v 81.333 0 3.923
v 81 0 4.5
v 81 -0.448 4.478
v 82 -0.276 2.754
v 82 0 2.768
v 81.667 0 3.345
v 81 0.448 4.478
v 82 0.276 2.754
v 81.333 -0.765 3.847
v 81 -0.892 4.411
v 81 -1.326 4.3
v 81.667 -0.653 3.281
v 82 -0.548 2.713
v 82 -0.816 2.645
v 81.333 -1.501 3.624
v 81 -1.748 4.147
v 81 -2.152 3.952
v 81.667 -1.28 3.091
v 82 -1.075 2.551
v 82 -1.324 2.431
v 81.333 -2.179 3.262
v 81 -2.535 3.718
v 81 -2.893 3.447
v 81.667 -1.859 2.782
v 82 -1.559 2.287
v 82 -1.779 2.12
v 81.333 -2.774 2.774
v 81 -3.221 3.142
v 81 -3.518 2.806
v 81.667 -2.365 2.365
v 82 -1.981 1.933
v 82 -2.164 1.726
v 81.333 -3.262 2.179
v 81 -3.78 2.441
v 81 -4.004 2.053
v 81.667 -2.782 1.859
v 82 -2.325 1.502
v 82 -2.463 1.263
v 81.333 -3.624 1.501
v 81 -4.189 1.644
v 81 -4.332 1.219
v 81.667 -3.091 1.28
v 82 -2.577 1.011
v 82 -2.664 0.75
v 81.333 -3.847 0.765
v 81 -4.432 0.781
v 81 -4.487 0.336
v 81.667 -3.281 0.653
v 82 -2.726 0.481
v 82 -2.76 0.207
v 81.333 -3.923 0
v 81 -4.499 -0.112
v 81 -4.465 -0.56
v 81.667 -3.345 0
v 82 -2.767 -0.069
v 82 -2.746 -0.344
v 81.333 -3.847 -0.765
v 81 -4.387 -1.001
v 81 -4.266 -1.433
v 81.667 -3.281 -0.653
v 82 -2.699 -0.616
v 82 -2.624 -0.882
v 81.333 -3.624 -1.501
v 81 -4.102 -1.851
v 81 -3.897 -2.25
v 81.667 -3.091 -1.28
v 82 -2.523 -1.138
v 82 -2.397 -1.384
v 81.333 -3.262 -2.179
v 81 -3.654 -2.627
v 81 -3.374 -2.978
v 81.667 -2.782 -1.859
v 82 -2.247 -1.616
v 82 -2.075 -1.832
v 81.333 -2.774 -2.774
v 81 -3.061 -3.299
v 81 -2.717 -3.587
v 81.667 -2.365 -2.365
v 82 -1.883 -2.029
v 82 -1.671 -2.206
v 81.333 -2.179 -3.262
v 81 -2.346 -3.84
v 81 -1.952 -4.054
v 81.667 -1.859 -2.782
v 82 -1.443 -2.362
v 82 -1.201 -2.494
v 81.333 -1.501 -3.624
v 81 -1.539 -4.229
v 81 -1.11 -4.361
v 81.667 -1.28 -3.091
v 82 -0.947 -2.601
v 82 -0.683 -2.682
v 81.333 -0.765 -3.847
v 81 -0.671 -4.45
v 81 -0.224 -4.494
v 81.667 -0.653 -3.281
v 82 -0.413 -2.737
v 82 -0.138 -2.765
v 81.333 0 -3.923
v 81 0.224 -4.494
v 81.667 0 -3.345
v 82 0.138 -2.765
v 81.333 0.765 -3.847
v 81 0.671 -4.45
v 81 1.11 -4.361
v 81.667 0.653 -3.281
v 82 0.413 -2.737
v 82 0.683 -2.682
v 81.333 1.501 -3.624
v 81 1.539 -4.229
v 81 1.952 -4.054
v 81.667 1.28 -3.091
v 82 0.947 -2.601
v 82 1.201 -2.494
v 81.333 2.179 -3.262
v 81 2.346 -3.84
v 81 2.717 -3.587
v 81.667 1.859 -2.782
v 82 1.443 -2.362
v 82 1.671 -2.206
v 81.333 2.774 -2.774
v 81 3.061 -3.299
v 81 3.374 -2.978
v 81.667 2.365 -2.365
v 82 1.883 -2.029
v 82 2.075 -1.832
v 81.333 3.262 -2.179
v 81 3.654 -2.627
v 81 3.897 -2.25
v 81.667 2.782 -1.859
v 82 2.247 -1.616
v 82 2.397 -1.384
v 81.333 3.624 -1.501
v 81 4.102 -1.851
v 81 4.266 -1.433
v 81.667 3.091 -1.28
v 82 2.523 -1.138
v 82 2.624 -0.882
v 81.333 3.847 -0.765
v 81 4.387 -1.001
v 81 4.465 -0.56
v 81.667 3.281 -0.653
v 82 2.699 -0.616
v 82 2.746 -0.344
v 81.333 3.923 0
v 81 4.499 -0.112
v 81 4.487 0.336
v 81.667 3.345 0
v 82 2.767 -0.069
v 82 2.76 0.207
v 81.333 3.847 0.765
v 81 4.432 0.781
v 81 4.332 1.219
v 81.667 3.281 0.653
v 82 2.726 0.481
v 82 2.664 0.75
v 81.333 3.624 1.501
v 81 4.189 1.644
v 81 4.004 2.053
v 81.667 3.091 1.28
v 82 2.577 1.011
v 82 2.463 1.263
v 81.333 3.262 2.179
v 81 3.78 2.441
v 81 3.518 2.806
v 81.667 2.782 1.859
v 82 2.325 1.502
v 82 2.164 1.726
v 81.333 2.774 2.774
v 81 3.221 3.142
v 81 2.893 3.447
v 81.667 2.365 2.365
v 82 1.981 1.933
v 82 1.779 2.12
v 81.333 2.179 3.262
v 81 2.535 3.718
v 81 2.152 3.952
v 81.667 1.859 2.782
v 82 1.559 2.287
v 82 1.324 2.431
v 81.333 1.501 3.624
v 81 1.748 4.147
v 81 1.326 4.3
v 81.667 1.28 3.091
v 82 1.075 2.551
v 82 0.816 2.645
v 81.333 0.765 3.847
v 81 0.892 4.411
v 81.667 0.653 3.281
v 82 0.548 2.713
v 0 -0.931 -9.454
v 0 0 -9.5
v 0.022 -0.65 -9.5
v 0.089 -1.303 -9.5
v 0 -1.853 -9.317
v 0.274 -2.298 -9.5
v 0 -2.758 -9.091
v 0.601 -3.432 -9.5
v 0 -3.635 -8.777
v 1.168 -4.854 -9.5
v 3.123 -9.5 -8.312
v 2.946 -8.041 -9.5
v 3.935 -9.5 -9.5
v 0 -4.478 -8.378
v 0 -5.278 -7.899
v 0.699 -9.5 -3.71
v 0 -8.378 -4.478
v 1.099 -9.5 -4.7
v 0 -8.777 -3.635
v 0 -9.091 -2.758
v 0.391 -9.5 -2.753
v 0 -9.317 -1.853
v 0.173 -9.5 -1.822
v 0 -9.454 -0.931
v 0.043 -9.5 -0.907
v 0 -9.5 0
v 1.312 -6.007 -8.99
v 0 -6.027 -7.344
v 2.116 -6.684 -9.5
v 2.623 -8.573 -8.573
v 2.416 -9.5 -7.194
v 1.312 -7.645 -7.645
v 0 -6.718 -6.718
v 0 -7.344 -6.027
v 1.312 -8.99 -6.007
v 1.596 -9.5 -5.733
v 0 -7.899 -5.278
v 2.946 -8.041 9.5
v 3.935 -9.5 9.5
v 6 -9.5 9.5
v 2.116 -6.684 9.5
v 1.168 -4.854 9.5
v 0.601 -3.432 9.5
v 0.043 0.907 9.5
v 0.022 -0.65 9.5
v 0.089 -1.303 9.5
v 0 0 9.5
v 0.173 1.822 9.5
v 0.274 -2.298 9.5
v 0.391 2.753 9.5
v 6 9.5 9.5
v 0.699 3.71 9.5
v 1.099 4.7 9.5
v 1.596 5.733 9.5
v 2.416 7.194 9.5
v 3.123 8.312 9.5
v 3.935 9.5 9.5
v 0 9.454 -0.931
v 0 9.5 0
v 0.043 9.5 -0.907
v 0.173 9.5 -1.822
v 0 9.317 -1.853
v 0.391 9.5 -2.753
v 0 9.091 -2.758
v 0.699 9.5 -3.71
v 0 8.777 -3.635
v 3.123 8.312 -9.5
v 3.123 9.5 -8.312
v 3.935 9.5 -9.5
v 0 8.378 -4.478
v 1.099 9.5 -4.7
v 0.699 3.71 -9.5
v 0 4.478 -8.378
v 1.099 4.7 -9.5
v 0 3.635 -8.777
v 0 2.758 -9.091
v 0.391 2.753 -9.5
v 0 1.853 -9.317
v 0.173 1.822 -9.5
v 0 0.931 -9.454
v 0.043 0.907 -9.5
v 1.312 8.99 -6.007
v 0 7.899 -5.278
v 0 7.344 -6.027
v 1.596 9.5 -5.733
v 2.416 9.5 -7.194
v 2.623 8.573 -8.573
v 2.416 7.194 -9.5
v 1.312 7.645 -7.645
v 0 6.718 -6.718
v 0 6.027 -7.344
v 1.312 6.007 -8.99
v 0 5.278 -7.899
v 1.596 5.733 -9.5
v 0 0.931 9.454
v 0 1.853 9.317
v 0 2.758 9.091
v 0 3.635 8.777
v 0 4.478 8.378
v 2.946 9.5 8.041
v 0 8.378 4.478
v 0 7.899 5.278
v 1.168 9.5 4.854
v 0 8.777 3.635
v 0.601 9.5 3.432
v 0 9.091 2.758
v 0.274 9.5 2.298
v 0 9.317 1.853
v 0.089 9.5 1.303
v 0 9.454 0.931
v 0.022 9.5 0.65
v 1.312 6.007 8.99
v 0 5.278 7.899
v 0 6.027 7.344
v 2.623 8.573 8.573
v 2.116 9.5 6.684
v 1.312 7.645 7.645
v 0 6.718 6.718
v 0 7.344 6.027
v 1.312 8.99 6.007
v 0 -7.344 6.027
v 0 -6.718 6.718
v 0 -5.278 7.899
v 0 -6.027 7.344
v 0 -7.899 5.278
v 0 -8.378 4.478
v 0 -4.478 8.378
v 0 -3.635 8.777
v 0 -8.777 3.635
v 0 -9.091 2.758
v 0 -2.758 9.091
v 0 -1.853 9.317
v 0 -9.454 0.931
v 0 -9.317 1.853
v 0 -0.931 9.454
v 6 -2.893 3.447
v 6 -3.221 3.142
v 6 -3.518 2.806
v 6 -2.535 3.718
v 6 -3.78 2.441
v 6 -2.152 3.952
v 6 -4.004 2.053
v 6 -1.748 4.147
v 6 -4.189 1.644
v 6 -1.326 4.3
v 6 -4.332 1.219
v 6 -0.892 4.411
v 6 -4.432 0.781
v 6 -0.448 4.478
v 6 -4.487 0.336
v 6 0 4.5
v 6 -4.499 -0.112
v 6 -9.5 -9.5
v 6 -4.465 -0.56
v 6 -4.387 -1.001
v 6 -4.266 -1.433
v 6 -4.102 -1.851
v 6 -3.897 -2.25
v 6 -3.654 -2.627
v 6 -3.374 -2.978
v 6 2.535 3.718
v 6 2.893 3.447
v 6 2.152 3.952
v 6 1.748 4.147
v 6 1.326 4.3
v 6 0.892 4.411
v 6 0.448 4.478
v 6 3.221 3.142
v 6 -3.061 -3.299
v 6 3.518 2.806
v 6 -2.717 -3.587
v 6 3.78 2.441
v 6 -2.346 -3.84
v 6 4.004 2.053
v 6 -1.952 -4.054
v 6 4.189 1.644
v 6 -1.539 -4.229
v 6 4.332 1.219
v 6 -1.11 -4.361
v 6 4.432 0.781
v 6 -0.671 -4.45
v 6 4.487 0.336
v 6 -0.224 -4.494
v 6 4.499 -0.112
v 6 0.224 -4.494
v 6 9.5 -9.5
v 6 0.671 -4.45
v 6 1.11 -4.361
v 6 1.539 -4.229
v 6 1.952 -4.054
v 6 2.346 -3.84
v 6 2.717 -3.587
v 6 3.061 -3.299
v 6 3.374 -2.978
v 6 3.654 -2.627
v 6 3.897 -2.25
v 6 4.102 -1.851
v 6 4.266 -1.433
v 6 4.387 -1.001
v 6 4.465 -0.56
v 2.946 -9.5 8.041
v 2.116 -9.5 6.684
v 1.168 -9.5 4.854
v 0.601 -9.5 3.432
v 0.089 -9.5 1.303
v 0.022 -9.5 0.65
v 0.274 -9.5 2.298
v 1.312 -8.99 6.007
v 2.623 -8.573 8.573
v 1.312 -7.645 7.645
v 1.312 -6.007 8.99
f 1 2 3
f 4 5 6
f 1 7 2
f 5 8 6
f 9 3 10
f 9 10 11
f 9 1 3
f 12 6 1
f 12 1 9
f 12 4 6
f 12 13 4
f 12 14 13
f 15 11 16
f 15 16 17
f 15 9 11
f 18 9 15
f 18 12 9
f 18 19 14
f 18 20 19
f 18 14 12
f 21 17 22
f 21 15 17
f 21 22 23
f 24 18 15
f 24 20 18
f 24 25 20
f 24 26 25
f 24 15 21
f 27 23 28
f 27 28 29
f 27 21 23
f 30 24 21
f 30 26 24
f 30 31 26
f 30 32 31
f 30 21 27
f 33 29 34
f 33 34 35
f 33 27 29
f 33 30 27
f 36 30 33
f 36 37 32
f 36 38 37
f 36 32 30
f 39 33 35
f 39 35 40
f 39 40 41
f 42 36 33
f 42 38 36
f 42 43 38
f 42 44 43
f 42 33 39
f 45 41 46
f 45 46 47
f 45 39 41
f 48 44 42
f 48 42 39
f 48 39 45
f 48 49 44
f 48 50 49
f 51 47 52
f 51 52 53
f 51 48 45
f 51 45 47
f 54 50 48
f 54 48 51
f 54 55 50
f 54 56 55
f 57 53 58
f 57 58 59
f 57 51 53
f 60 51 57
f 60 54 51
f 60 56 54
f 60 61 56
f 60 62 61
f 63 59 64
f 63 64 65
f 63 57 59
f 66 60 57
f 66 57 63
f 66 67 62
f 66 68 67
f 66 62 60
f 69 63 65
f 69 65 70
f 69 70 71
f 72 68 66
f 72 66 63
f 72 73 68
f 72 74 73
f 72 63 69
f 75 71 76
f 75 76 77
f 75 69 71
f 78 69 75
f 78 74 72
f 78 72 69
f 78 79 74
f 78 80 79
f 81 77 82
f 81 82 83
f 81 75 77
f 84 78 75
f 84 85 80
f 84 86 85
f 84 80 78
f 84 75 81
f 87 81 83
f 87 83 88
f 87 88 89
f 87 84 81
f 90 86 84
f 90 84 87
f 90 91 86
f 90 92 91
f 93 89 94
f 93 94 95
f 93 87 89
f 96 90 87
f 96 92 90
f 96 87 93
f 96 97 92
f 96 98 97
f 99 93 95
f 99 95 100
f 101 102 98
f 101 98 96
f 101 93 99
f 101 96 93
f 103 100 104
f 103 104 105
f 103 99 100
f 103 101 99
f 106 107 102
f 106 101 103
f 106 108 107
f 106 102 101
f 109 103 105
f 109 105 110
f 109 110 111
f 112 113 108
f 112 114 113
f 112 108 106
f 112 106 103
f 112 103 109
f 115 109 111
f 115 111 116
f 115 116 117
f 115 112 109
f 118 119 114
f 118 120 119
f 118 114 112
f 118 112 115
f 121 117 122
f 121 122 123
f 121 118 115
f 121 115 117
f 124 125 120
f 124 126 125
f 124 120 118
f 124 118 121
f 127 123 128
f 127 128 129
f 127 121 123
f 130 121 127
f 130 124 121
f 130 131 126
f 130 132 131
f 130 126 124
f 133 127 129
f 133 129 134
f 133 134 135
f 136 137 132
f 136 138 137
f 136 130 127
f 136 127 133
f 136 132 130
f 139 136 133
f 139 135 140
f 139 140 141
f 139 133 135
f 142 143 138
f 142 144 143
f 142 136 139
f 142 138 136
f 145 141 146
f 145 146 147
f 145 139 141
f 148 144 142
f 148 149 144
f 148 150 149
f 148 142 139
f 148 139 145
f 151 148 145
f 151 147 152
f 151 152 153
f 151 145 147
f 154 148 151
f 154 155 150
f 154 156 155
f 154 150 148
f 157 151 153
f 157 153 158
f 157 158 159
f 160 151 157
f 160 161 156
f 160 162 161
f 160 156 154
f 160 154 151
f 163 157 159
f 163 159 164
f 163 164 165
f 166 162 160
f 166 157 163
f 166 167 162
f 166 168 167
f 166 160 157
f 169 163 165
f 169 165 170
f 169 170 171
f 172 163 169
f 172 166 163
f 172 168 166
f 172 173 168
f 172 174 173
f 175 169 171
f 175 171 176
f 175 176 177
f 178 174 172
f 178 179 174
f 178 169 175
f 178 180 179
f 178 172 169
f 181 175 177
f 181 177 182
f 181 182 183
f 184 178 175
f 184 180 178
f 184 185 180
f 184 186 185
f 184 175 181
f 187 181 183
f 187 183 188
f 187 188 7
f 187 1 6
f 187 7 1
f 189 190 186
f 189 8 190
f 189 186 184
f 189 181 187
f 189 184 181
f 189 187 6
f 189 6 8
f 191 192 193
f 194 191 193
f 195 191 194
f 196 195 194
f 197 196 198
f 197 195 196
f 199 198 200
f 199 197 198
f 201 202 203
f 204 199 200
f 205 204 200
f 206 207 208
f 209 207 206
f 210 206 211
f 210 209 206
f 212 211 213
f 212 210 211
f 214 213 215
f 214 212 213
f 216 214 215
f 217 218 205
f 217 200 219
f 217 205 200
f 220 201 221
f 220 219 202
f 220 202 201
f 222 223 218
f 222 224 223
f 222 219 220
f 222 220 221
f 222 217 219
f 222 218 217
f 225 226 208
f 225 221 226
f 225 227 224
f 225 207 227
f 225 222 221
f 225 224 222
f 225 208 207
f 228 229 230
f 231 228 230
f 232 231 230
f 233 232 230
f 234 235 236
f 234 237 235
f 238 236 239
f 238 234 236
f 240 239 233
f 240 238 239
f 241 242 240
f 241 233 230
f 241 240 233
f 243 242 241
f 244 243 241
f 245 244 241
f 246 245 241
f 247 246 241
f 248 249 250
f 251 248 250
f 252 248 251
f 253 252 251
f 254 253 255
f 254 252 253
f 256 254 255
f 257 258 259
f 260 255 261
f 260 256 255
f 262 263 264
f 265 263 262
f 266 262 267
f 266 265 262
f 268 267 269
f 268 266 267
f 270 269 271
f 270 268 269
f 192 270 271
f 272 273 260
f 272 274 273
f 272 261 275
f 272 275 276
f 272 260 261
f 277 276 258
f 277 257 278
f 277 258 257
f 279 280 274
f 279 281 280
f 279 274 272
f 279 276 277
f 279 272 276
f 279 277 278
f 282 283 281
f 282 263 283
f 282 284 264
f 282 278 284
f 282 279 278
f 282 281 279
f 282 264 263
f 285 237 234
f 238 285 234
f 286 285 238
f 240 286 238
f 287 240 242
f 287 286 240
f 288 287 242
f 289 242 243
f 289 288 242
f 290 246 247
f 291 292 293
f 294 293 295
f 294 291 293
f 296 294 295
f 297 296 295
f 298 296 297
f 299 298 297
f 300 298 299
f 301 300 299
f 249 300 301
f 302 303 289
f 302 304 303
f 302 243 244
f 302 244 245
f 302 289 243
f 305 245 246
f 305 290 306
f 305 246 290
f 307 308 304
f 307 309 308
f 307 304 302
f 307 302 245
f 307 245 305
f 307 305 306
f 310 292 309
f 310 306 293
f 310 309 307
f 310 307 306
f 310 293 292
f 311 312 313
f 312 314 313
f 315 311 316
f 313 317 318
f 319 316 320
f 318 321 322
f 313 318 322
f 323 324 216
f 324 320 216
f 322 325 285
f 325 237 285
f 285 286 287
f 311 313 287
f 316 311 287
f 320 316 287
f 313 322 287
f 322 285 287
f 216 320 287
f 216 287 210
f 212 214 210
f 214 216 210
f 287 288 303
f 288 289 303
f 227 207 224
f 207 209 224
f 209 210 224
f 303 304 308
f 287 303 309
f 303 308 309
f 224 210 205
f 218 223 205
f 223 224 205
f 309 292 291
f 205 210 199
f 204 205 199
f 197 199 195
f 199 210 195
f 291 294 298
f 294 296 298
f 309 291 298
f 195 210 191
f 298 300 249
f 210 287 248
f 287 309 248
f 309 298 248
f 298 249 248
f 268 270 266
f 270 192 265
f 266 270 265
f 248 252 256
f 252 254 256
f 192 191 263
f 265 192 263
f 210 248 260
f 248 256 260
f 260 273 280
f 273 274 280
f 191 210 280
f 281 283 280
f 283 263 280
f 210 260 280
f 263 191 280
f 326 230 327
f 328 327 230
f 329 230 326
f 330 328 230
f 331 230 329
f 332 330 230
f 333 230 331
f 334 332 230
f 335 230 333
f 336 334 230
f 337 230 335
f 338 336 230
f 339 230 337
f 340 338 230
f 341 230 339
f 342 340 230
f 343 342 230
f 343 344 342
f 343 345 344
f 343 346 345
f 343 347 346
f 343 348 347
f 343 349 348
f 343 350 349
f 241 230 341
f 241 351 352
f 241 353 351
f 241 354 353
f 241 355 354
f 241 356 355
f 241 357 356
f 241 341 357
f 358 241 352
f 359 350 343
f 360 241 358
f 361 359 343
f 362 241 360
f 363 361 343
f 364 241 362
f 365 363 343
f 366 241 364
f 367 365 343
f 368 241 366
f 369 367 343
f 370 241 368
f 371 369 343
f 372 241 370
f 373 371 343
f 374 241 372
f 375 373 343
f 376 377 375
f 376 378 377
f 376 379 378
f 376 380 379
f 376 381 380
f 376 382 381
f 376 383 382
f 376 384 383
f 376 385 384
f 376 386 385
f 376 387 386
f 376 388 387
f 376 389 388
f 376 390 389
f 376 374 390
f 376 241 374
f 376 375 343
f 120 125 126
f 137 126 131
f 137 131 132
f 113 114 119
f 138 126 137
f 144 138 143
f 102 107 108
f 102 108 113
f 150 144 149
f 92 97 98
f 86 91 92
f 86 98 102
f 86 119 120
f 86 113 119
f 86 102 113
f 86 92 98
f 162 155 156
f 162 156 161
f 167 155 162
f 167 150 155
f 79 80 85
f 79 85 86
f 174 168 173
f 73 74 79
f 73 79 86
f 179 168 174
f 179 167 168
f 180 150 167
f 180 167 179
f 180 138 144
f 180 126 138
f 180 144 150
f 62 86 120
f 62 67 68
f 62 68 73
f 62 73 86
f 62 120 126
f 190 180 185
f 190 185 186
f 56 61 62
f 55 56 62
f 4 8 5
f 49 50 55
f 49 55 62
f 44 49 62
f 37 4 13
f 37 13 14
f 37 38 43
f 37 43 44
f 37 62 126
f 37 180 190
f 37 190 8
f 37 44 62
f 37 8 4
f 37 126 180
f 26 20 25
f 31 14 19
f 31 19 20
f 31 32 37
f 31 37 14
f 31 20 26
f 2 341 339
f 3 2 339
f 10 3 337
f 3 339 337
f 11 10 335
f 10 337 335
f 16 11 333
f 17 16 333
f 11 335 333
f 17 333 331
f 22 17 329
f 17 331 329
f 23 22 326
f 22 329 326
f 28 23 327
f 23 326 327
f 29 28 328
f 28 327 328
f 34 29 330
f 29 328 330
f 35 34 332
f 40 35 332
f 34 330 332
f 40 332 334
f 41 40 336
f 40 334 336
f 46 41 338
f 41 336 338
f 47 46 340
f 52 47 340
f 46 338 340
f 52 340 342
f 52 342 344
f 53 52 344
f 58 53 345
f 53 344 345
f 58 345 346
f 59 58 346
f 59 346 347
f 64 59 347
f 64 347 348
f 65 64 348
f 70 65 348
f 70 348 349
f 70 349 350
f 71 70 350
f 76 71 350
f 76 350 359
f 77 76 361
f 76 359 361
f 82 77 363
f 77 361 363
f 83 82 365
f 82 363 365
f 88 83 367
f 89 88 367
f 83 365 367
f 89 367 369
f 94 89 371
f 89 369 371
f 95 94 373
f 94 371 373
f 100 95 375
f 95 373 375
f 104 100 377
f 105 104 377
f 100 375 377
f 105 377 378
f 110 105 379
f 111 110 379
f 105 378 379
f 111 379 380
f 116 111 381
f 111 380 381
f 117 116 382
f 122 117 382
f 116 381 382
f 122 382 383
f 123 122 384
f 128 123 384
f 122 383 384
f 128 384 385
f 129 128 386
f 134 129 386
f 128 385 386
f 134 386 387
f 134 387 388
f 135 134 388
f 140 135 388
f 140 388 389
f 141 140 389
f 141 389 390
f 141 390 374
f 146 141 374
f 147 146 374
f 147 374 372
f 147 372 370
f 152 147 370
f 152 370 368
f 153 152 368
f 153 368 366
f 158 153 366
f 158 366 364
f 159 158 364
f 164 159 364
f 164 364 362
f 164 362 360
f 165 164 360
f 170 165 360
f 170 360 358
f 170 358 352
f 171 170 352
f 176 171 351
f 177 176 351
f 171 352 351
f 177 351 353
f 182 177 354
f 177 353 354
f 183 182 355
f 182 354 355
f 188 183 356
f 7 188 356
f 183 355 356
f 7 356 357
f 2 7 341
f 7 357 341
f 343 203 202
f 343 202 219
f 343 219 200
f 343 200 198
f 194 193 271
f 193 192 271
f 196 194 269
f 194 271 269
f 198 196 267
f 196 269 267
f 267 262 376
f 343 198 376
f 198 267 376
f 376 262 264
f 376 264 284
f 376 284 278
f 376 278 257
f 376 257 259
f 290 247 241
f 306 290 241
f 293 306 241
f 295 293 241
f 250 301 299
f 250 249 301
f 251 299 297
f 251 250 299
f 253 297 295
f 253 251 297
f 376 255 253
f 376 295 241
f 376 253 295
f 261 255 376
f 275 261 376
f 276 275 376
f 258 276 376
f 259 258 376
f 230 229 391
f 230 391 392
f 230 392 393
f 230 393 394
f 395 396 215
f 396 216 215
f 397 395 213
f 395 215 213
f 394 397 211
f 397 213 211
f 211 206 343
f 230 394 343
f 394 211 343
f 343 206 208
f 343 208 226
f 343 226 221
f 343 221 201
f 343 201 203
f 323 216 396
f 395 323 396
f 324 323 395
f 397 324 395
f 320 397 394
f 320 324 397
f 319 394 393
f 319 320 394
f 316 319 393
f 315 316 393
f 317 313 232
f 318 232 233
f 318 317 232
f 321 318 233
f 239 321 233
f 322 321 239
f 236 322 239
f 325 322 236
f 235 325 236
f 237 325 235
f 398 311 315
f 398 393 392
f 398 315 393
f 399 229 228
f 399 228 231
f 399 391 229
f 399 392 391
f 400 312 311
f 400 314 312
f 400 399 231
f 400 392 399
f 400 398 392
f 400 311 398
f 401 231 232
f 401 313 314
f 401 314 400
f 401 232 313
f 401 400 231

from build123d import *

# Parameters (mm, degrees)
SKETCH1_W           = 19
SKETCH1_H           = 19
BOSS_EXTRUDE1_DEPTH = 6
SKETCH2_R           = 4.5
BOSS_EXTRUDE2_DEPTH = 76
CHAMFER1_SIZE       = 1
CHAMFER1_SIZE2      = 1.732050808
SKETCH3_OUTSIDE_W   = 58.258
SKETCH3_OUTSIDE_H   = 58.258
SKETCH3_OUTSIDE_R   = 9.5
CUT_EXTRUDE1_DEPTH  = 10
CUT_EXTRUDE1_DRAFT  = -45


with BuildPart() as part:
    # Sketch1 → Boss-Extrude1 (new body)
    with BuildSketch(Plane(origin=(0, 0, 0), x_dir=(0, 0, -1), z_dir=(1, 0, 0))):
        Rectangle(SKETCH1_W, SKETCH1_H)
    extrude(amount=BOSS_EXTRUDE1_DEPTH)

    # Sketch2 → Boss-Extrude2 (add)
    with BuildSketch(Plane(origin=(6, 0, 0), x_dir=(0, 0, -1), z_dir=(1, 0, 0))):
        with Locations(Location((0, 0, 0), (0, 0, 180))):  # turned: the seam where the file's is
            Circle(SKETCH2_R)
    extrude(amount=BOSS_EXTRUDE2_DEPTH)

    # Chamfer1
    chamfer1_edges = [part.edges().sort_by_distance(p)[0] for p in [
        (82, 0, -4.5),
    ]]
    chamfer1_side = [part.faces().sort_by_distance(p)[0] for p in [
        (44, 0, -4.5),
    ]]
    chamfer(chamfer1_edges, length=CHAMFER1_SIZE, length2=CHAMFER1_SIZE2, reference=chamfer1_side[0])


with BuildPart() as cut_extrude1_tool:
    # Sketch3 outside → Cut-Extrude1 (with draft: the straight prism first)
    with BuildSketch(Plane.ZY):
        Rectangle(SKETCH3_OUTSIDE_W, SKETCH3_OUTSIDE_H)
        Circle(SKETCH3_OUTSIDE_R, mode=Mode.SUBTRACT)
    extrude(amount=-CUT_EXTRUDE1_DEPTH)
    # Cut-Extrude1: the draft: its side faces are tilted about the plane it starts from
    cut_extrude1_sides = [cut_extrude1_tool.faces().sort_by_distance(p)[0] for p in [
        (5, -29.129, 0),
        (5, 0, 29.129),
        (5, 29.129, 0),
        (5, 0, -29.129),
        (5, 0, -9.5),
    ]]
    draft(cut_extrude1_sides, Plane.ZY, CUT_EXTRUDE1_DRAFT)


with BuildPart() as part_1:
    add(part.part)

    # Cut-Extrude1: cut by cut_extrude1_tool
    add(cut_extrude1_tool.part, mode=Mode.SUBTRACT)


solid = part_1.part
